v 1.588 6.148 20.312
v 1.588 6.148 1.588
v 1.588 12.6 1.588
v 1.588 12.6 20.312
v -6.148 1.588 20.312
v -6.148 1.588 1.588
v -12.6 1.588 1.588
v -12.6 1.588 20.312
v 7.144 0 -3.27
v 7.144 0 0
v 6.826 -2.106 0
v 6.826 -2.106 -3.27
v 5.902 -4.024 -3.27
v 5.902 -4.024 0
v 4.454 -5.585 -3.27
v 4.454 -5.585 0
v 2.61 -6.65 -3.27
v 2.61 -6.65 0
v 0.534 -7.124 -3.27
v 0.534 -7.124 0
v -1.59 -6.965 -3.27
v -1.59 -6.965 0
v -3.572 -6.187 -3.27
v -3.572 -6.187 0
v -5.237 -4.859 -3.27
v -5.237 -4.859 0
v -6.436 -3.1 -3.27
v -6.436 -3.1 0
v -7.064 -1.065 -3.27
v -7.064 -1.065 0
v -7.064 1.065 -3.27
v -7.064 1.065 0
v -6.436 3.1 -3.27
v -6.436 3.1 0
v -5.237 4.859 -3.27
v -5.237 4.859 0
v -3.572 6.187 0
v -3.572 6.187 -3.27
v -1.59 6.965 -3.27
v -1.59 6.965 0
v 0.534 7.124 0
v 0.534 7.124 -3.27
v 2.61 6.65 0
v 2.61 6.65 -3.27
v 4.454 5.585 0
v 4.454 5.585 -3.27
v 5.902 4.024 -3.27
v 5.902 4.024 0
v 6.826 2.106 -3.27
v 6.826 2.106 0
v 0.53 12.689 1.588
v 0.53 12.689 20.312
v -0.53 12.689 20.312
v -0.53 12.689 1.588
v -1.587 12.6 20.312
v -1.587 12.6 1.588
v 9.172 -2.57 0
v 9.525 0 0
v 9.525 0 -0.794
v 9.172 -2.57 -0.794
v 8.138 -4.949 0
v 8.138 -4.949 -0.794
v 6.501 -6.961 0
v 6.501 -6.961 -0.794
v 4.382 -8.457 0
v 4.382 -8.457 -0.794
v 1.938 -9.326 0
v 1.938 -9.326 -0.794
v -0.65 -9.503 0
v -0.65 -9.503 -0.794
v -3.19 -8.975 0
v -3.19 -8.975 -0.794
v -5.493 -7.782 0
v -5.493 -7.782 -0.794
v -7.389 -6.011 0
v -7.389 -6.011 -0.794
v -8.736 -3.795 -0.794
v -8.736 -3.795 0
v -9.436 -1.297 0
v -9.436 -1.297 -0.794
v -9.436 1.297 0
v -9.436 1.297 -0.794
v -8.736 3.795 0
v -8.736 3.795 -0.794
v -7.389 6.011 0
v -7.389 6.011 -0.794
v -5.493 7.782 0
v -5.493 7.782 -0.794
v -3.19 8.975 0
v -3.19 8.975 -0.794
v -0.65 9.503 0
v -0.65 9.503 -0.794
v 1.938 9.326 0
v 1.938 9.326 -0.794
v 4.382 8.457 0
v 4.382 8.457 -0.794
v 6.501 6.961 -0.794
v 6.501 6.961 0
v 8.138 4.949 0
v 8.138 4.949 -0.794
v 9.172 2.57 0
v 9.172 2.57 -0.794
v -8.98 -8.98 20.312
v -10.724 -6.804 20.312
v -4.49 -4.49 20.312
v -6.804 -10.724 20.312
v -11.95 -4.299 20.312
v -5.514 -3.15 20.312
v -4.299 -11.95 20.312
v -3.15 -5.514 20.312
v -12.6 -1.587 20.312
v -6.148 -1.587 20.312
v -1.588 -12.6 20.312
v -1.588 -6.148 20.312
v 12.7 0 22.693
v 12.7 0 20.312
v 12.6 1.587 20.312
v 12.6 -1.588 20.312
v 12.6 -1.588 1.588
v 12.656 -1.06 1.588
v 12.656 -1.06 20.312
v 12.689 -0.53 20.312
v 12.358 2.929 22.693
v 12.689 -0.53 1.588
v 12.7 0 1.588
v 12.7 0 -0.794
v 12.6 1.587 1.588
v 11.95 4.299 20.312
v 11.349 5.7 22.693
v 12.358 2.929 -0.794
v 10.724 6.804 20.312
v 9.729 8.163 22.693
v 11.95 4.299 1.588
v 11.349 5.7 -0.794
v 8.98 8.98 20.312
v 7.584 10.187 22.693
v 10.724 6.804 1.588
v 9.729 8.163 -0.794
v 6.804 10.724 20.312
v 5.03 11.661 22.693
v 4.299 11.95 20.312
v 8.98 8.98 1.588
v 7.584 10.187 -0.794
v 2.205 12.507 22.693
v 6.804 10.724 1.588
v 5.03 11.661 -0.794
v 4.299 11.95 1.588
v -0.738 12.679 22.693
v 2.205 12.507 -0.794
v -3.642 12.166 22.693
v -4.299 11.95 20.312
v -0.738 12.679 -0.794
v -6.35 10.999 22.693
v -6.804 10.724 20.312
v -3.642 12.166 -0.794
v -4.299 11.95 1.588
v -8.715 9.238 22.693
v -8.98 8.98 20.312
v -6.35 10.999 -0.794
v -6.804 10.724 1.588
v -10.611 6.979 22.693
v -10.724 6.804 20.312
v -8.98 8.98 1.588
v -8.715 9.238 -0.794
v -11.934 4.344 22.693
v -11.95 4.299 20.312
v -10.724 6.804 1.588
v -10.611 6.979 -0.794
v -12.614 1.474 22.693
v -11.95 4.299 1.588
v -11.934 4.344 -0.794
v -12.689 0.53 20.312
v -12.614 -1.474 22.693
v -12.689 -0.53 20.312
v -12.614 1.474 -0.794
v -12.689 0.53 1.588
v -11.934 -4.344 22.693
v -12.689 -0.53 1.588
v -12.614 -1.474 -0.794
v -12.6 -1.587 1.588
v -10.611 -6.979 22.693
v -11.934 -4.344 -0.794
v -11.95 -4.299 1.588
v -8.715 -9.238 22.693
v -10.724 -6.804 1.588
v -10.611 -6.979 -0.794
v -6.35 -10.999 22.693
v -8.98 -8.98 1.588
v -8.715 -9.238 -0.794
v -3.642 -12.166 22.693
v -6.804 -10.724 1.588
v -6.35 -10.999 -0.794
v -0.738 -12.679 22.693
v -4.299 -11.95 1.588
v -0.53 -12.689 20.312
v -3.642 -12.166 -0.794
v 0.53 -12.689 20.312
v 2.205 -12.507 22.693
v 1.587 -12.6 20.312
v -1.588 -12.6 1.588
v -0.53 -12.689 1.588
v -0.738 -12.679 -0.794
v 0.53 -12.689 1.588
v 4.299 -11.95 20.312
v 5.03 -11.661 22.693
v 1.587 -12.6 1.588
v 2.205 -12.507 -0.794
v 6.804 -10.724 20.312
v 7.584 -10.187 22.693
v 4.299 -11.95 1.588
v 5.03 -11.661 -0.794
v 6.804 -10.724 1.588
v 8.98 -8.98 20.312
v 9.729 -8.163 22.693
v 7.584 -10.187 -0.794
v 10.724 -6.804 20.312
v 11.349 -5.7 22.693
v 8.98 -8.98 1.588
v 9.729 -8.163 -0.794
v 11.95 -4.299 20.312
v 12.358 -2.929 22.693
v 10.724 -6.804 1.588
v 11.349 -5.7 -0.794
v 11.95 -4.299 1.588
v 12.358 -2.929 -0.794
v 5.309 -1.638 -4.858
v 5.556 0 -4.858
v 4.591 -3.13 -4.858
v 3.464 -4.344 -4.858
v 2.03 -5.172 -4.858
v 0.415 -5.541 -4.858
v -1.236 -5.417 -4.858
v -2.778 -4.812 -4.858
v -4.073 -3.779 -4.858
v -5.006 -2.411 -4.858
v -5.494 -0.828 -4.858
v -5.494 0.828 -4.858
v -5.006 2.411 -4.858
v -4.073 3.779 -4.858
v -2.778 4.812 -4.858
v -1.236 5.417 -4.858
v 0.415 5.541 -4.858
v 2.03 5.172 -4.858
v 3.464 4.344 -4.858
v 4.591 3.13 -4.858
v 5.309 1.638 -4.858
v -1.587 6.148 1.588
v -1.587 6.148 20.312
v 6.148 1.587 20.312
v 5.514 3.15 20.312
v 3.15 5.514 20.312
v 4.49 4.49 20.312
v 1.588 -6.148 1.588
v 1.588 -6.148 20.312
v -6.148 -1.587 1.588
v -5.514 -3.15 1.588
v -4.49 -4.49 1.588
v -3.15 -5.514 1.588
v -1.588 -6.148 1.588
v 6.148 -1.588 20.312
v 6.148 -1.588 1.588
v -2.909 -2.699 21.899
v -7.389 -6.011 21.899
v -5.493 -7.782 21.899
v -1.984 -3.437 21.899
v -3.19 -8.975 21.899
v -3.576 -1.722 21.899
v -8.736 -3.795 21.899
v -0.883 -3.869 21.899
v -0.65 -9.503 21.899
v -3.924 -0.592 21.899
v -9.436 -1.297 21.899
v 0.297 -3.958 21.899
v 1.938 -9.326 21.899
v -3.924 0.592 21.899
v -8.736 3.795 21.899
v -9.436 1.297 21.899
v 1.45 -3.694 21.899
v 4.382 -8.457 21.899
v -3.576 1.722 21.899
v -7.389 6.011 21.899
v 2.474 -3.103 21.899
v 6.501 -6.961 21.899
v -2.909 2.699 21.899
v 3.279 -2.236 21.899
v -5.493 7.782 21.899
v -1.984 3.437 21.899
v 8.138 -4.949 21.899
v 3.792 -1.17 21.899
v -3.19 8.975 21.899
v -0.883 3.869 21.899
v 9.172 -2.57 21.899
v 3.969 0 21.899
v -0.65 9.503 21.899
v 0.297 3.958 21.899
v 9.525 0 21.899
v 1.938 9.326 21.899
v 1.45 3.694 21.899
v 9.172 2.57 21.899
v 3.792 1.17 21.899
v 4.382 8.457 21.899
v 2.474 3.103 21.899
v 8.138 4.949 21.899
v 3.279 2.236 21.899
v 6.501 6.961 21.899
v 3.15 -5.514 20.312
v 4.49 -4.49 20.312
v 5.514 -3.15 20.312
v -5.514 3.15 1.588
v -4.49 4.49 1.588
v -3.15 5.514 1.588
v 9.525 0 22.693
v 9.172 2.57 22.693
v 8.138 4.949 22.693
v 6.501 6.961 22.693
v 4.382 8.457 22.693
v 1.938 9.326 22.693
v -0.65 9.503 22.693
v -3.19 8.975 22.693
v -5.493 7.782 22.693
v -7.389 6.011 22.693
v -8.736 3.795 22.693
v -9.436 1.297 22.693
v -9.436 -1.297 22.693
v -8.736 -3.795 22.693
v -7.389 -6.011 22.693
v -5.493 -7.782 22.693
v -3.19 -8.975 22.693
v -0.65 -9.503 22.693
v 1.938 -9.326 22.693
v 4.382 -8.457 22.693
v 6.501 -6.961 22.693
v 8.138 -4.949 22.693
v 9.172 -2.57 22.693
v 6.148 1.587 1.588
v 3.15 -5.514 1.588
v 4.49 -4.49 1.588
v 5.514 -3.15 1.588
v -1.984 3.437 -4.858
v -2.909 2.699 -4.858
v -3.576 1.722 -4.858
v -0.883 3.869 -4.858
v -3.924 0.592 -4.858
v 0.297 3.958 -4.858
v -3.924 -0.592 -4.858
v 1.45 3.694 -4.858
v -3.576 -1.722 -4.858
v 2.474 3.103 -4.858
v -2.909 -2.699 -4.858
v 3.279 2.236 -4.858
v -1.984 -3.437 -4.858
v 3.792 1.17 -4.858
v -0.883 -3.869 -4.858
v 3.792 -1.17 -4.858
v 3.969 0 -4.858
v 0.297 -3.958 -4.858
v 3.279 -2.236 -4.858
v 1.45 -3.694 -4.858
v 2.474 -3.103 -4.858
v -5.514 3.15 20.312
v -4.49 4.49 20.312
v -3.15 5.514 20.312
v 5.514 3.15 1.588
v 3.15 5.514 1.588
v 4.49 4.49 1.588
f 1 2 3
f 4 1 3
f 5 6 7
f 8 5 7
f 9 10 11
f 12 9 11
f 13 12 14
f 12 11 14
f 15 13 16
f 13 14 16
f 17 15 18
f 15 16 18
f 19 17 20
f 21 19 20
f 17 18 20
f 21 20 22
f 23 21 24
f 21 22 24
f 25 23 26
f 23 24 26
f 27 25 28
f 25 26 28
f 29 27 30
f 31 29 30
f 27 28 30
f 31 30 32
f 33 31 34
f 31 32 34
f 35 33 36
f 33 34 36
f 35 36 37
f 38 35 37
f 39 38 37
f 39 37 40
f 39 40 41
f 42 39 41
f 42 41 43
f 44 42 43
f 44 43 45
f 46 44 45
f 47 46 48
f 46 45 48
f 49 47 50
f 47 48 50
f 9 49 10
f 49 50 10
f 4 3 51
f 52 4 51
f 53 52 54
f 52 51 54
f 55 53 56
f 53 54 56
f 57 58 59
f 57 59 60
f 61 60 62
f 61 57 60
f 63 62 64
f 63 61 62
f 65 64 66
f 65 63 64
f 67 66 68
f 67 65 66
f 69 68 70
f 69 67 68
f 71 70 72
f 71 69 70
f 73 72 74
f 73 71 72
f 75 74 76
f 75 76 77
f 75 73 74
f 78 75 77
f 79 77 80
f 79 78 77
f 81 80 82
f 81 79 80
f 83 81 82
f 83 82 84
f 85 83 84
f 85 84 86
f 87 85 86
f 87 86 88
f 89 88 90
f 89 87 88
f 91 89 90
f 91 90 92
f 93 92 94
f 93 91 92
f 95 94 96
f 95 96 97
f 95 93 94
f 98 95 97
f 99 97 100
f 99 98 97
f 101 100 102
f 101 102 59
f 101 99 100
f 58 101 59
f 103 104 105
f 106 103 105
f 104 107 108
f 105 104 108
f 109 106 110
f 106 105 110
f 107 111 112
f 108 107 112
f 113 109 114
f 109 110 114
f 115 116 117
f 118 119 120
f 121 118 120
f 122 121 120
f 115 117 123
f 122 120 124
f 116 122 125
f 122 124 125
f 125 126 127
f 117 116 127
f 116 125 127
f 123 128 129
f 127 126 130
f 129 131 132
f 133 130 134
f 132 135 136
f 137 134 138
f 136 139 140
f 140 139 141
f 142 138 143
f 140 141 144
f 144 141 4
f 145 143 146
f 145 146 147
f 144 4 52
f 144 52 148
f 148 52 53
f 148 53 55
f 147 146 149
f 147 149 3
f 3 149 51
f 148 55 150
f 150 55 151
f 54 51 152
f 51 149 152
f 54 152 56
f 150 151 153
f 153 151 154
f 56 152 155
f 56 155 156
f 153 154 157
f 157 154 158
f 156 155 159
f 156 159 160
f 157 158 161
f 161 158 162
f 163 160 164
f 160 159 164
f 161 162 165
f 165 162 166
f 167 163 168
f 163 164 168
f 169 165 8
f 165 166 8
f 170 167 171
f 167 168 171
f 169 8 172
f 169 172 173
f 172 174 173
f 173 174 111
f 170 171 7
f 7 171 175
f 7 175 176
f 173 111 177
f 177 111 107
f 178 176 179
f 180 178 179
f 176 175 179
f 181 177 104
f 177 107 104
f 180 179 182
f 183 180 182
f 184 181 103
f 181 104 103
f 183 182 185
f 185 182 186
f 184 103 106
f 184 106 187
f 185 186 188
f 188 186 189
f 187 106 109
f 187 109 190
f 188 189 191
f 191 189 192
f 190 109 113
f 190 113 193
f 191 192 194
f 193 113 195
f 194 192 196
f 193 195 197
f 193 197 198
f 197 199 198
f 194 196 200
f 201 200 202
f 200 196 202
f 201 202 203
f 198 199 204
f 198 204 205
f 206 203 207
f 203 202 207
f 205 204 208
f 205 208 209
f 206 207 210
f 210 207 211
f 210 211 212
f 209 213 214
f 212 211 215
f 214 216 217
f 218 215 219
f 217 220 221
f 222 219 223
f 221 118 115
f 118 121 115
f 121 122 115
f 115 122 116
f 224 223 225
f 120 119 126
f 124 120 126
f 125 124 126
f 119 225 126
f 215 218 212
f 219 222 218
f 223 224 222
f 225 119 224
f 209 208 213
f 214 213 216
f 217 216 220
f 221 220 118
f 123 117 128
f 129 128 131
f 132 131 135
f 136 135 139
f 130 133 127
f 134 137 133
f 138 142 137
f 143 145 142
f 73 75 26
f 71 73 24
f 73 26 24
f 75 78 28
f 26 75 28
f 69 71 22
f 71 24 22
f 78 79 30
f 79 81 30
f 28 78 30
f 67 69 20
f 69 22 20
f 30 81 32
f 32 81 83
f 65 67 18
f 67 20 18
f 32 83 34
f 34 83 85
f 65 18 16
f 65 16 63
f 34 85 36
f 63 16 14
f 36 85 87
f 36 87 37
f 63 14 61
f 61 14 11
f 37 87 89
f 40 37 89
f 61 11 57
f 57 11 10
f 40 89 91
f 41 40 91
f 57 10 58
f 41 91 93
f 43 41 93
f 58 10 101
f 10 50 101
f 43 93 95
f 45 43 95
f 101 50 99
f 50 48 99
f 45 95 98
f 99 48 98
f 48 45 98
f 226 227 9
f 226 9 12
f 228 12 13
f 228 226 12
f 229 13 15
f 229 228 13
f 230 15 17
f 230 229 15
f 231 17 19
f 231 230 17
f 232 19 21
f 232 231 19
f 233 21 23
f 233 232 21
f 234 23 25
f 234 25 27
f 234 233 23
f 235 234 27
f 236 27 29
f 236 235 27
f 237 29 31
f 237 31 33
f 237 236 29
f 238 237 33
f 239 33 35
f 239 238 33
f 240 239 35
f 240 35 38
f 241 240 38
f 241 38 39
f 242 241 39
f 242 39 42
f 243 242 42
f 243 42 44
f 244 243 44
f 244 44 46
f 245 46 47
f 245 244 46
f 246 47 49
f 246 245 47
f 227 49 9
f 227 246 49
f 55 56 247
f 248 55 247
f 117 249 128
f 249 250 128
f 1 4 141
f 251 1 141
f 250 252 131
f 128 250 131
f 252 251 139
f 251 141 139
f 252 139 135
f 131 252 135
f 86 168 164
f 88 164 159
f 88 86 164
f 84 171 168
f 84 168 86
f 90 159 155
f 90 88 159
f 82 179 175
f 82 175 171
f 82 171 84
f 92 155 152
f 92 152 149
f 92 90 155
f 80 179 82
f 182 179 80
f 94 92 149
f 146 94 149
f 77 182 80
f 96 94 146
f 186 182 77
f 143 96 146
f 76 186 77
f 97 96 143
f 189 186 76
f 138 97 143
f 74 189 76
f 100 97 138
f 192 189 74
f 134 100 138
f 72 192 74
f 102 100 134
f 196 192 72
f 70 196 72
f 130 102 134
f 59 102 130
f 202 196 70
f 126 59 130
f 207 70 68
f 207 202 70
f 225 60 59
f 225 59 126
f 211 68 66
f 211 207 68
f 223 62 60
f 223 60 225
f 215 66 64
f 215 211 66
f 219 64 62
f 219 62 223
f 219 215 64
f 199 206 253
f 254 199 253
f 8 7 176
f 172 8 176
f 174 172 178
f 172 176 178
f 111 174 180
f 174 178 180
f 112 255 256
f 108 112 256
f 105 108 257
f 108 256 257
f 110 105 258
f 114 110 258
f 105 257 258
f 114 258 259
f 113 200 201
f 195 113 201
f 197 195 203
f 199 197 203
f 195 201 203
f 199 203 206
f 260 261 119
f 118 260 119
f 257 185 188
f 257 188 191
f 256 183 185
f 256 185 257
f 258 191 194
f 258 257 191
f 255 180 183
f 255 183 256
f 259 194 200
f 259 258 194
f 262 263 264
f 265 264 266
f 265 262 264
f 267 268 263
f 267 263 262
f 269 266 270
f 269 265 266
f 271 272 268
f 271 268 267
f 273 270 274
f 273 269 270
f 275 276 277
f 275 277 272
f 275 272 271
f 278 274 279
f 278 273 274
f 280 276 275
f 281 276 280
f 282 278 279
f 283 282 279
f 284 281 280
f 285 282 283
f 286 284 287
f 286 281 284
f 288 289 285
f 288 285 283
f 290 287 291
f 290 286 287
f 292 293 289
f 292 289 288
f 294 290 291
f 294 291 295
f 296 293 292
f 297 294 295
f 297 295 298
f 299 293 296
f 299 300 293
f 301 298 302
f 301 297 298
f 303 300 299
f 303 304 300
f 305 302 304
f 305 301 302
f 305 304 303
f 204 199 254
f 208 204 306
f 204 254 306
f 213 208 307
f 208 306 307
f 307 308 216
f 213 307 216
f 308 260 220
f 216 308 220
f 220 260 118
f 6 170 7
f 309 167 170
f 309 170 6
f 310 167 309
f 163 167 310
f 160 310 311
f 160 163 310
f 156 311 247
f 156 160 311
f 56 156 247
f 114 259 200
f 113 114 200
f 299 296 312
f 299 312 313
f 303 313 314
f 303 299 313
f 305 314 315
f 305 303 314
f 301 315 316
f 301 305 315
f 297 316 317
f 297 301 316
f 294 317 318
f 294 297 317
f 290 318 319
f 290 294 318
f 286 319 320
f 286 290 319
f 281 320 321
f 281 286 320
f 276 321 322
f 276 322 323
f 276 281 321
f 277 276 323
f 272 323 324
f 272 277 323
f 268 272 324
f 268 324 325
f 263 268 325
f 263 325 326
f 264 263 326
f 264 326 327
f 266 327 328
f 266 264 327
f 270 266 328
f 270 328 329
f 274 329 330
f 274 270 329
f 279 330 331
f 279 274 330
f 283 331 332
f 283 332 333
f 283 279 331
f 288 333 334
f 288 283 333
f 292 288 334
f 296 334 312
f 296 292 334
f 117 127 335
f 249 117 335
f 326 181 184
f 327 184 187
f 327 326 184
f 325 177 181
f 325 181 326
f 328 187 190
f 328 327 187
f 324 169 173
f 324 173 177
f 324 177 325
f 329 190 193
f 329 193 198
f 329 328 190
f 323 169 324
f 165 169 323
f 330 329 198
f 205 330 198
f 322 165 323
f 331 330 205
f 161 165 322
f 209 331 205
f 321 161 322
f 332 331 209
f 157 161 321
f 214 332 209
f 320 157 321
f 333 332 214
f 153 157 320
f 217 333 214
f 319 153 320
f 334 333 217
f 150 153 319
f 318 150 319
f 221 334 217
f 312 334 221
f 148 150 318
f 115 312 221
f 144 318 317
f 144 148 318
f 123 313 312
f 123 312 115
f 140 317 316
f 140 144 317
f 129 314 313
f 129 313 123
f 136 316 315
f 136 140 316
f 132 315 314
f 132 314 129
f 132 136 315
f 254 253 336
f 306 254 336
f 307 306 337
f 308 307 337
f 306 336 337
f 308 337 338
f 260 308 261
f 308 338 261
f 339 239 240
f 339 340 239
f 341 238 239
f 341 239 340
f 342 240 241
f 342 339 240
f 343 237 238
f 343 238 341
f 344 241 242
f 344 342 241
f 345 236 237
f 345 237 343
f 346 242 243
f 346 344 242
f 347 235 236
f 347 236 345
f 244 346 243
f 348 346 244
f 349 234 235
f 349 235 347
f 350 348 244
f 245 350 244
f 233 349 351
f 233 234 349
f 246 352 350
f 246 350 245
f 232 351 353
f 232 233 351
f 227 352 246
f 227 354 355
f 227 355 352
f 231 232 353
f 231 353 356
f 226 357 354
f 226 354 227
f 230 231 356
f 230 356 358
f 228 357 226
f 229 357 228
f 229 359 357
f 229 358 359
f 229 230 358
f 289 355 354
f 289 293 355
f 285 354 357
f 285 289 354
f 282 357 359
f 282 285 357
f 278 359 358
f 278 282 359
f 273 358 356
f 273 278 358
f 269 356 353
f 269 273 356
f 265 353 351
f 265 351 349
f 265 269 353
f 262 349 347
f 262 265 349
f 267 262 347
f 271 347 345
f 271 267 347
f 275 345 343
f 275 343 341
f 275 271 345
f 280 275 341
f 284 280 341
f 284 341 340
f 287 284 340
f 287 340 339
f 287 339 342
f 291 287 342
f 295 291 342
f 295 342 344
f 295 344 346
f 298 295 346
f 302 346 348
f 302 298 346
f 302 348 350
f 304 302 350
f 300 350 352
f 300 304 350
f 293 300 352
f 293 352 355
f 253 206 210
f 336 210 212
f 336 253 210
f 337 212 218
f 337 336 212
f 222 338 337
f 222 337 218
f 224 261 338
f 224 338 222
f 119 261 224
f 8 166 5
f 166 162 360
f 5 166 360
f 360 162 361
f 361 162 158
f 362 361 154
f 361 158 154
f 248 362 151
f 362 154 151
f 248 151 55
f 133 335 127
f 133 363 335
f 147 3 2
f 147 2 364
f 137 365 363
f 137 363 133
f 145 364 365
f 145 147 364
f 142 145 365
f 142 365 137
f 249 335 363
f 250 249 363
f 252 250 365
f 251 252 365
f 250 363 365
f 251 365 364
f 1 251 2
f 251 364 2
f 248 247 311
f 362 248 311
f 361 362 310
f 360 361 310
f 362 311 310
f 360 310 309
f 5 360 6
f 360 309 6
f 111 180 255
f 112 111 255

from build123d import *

# Parameters (mm, degrees)
F0_R             = 12.7
F0_R_2           = 3.96875
F1_DEPTH         = 1.5875
F2_R             = 12.7
F2_R_2           = 9.525
F3_DEPTH         = 0.79375
F4_R             = 6.35
F4_R_2           = 3.96875
F5_DEPTH         = 18.7244736
F6_R             = 12.7
F6_R_2           = 3.96875
F7_DEPTH         = 1.5875
F8_R             = 12.7
F8_R_2           = 9.525
F9_DEPTH         = 0.79375
F11_DEPTH        = 18.7244736
F11_COPIES_COUNT = 4
F12_R            = 7.14375
F12_R_2          = 3.96875
F13_DEPTH        = 4.85775
F14_SIZE         = 1.5875


# Not quite as in the source:
# - a length typed as a fraction of an inch, garbled in the dataset ("3 / 203.2 mm" for 3/8 in), is restored
# - a pattern or mirror of a feature is missing from the dataset's text; its kind, count and spacing are read off the source's solid


with BuildPart() as f1:
    # F0 (on Top) → F1 (new body)
    with BuildSketch(Plane.XY):
        Circle(F0_R)
        Circle(F0_R_2, mode=Mode.SUBTRACT)
    extrude(amount=F1_DEPTH)

    # F2 (on face) → F3 (join)
    with BuildSketch(Plane(origin=(0, 0, 0), x_dir=(1, 0, 0), z_dir=(0, 0, -1))):
        Circle(F2_R)
        Circle(F2_R_2, mode=Mode.SUBTRACT)
    extrude(amount=F3_DEPTH)

    # F4 (on face) → F5 (join)
    with BuildSketch(Plane.XY.offset(1.5875)):
        Circle(F4_R)
        Circle(F4_R_2, mode=Mode.SUBTRACT)
    extrude(amount=F5_DEPTH)

    # F6 (on face) → F7 (join)
    with BuildSketch(Plane.XY.offset(20.3119736)):
        Circle(F6_R)
        Circle(F6_R_2, mode=Mode.SUBTRACT)
    extrude(amount=F7_DEPTH)

    # F8 (on face) → F9 (join)
    with BuildSketch(Plane.XY.offset(21.8994736)):
        Circle(F8_R)
        Circle(F8_R_2, mode=Mode.SUBTRACT)
    extrude(amount=F9_DEPTH)

    # F10 (on face) → F11 (join, through all)
    with BuildSketch(Plane.XY.offset(1.5875)):
        with BuildLine():
            Line((1.5875, -12.6003906189), (1.5875, -6.1483610621))
            ThreePointArc((1.5875, -6.1483610621), (0, -6.35), (-1.5875, -6.1483610621))
            Line((-1.5875, -6.1483610621), (-1.5875, -12.6003906189))
            ThreePointArc((-1.5875, -12.6003906189), (0, -12.7), (1.5875, -12.6003906189))
        make_face()
    f11 = extrude(amount=F11_DEPTH)

    # F11_copies: F11 ×4 about axis
    f11_copies_axis = Axis((0, 0, 0), (0, 0, 1))
    for i in range(1, F11_COPIES_COUNT):
        add(f11.rotate(f11_copies_axis, i * 360 / F11_COPIES_COUNT))

    # F12 (on face) → F13 (join)
    with BuildSketch(Plane(origin=(0, 0, 0), x_dir=(1, 0, 0), z_dir=(0, 0, -1))):
        Circle(F12_R)
        Circle(F12_R_2, mode=Mode.SUBTRACT)
    extrude(amount=F13_DEPTH)

    # F14
    f14_edges = [f1.edges().sort_by_distance(p)[0] for p in [
        (-7.14375, 0, -4.85775),
    ]]
    chamfer(f14_edges, length=F14_SIZE)


solid = f1.part
